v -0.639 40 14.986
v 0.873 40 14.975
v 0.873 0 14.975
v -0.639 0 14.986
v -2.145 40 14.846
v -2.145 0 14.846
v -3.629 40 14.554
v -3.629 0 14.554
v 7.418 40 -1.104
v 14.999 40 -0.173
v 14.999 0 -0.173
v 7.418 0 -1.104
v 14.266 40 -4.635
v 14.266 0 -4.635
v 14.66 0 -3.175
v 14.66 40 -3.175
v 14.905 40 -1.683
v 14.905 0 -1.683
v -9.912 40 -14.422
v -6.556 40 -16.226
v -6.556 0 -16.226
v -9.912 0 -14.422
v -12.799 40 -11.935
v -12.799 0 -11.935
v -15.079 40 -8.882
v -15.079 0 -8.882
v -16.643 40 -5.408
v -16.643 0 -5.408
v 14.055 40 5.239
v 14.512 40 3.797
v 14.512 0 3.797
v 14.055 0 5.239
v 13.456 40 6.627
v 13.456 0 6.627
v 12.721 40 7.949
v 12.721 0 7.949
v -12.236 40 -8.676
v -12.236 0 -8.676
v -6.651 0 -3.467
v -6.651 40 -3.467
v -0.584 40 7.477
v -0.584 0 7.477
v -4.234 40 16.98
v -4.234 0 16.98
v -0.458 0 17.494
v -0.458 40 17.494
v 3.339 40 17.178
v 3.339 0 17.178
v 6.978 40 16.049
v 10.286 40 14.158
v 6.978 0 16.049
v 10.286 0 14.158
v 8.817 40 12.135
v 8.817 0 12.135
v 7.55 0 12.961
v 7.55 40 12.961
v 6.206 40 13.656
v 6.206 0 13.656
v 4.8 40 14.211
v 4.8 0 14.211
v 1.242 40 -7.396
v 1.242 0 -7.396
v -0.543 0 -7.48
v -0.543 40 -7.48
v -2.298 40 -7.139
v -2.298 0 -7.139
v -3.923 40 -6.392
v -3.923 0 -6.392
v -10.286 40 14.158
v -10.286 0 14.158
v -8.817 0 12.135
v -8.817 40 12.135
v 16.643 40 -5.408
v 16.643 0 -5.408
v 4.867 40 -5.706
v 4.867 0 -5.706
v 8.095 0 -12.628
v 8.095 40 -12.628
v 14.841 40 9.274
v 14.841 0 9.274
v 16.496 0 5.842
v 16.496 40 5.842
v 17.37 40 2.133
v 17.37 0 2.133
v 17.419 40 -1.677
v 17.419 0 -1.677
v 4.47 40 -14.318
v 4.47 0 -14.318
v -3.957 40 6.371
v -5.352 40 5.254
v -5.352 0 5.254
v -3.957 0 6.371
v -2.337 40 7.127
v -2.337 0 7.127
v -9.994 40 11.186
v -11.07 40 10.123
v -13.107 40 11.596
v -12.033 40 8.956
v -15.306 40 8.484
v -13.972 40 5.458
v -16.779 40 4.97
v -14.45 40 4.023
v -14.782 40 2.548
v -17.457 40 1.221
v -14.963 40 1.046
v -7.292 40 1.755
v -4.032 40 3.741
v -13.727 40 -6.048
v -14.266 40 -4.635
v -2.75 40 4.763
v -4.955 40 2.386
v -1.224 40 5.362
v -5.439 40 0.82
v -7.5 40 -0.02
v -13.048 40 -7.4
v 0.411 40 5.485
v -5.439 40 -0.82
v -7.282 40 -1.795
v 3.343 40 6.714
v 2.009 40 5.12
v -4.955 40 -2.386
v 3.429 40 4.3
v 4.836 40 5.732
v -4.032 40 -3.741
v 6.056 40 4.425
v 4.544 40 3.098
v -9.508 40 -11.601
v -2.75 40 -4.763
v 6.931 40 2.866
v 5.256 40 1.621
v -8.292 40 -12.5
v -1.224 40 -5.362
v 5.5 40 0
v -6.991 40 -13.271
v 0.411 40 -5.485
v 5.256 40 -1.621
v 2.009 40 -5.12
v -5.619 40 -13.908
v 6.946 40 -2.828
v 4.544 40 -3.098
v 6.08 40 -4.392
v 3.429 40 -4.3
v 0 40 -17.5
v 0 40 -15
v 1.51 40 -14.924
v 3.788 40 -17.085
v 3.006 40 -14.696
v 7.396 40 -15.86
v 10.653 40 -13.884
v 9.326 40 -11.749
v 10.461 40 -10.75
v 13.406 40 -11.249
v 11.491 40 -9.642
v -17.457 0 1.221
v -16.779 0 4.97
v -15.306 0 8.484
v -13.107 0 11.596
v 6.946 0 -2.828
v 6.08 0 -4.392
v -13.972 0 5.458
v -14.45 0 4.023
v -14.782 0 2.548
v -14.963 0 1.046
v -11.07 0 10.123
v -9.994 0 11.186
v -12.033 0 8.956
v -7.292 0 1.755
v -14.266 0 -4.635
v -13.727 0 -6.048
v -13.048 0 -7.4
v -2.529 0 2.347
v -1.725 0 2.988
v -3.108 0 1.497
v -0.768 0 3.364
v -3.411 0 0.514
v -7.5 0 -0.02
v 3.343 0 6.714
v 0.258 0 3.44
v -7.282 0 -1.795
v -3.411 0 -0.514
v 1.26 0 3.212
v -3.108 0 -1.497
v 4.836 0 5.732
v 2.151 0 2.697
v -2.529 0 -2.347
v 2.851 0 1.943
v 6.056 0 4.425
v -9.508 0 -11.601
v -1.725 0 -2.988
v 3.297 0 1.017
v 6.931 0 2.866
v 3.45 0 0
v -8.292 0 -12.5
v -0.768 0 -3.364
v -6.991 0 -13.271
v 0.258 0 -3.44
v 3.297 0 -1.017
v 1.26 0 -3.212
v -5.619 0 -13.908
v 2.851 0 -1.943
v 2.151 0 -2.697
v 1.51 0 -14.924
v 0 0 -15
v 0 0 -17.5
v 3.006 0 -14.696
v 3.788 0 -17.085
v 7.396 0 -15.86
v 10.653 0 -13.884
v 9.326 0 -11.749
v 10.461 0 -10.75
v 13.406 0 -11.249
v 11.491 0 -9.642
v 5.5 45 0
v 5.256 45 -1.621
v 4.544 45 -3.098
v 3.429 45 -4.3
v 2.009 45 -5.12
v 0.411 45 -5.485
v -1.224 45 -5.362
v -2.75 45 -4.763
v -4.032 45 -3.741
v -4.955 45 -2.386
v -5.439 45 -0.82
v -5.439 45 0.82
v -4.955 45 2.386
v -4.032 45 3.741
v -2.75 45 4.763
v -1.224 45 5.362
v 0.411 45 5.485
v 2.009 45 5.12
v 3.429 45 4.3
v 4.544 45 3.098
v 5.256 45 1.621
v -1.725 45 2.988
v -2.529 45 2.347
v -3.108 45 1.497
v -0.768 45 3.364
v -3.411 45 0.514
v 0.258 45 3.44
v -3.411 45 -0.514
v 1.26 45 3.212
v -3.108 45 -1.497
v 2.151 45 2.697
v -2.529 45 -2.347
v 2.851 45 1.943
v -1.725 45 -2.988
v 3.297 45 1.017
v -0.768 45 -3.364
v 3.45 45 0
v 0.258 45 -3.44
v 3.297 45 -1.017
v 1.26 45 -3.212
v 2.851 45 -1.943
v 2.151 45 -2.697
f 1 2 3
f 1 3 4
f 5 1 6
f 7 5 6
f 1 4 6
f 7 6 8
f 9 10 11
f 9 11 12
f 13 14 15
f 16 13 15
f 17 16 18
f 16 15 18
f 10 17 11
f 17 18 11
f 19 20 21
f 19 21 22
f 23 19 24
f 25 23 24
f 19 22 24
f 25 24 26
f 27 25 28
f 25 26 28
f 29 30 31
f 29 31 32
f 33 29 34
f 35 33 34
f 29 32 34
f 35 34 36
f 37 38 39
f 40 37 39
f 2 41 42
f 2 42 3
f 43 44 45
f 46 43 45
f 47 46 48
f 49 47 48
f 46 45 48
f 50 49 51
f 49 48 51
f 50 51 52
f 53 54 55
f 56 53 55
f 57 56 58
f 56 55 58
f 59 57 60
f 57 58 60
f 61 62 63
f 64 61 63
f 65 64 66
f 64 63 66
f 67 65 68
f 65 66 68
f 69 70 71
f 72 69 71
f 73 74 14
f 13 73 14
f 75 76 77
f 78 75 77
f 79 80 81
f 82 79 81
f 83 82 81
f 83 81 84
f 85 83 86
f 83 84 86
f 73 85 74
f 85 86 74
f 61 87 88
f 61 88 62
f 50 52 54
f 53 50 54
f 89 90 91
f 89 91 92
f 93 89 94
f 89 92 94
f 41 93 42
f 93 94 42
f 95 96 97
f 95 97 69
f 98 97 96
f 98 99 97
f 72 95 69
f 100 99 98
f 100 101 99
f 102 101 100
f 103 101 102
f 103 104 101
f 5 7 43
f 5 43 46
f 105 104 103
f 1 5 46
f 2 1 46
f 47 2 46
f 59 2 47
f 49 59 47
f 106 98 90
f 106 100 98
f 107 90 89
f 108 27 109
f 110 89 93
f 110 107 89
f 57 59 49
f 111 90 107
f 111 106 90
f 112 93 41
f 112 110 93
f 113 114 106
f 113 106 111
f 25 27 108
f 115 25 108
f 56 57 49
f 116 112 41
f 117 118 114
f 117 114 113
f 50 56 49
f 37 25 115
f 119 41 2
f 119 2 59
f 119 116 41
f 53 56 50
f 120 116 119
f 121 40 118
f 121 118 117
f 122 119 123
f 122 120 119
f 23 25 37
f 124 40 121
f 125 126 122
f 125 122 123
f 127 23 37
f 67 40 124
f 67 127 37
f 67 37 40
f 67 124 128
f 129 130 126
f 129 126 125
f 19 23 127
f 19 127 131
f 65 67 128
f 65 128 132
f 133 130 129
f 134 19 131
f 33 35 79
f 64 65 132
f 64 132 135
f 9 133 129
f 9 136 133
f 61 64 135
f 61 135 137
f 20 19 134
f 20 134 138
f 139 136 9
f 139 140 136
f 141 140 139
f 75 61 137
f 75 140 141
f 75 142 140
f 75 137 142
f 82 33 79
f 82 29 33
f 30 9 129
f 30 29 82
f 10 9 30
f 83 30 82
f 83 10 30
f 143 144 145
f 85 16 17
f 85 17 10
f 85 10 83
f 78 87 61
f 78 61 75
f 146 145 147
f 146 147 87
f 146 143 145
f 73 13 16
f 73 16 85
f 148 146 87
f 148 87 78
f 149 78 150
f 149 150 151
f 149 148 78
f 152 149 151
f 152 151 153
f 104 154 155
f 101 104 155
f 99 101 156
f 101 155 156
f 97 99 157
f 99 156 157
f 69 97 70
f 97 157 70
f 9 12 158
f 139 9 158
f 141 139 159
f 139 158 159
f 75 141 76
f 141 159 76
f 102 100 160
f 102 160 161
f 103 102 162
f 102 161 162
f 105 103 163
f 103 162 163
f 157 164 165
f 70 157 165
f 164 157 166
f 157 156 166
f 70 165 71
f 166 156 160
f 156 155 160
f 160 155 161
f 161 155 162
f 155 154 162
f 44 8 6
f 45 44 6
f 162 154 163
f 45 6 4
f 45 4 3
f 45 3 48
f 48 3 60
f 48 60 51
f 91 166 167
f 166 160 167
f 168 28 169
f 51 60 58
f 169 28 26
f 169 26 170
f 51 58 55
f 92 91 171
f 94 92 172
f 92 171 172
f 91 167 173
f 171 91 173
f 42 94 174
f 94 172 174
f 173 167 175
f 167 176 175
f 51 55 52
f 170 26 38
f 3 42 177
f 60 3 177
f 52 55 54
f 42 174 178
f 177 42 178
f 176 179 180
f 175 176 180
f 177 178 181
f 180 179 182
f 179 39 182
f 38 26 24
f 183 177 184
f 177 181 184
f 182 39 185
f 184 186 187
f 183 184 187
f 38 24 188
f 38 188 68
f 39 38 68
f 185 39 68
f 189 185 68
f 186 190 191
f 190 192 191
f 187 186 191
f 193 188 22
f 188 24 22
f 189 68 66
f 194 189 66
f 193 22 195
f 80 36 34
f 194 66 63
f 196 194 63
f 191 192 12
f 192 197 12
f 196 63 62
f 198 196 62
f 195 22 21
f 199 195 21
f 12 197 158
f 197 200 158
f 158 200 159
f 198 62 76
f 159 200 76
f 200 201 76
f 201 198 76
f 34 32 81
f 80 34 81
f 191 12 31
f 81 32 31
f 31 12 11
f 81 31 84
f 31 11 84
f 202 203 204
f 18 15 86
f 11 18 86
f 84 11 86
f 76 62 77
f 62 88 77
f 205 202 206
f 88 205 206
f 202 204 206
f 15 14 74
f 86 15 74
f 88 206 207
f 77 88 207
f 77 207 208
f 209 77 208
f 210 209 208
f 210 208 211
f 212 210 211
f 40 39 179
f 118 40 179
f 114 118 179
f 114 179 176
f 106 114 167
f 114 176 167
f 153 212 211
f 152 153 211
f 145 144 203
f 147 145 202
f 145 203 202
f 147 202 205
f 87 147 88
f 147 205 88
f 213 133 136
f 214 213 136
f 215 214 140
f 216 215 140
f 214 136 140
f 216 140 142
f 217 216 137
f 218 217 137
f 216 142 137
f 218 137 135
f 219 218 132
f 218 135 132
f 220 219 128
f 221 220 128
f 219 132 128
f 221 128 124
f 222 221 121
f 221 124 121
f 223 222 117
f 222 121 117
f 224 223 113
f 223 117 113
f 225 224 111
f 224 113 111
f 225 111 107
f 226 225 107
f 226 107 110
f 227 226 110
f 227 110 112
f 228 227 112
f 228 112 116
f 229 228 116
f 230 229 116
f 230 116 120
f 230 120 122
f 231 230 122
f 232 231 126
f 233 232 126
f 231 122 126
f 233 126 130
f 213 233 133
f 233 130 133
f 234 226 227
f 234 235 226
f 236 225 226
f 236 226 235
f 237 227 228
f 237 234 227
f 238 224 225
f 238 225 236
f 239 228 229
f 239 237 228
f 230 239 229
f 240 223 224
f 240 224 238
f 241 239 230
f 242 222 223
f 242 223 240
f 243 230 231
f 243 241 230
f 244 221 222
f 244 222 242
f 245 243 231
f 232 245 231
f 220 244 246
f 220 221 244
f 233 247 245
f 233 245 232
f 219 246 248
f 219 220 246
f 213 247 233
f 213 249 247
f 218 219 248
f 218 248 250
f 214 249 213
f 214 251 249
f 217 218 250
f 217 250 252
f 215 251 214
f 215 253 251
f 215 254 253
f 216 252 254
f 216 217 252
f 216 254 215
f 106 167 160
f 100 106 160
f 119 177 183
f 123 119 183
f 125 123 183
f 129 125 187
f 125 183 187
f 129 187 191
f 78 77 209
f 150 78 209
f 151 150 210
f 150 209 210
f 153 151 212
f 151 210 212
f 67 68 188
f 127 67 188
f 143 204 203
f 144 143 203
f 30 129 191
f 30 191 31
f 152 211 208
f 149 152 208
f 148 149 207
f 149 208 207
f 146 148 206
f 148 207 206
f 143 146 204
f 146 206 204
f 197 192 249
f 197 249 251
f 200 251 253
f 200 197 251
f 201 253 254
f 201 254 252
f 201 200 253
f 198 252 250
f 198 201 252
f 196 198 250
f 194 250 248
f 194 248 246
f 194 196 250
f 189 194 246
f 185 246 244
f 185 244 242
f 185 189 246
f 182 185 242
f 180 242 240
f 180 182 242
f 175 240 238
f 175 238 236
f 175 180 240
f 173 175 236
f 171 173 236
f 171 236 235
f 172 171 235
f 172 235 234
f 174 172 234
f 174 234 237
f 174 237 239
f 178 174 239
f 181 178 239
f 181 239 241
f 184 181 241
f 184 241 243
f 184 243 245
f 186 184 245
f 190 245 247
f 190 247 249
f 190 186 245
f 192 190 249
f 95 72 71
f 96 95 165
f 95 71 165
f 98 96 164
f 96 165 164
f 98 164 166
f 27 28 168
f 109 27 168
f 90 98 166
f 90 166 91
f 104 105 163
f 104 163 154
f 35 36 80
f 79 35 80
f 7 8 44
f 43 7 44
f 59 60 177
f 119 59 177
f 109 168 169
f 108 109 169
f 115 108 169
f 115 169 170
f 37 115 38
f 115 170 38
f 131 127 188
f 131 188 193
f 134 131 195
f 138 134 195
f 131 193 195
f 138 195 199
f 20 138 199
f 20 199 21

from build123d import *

# Parameters (mm, degrees)
BOSS_EXTRUDE2_DEPTH   = 40
BOSS_EXTRUDE2_2_DEPTH = 40
BOSS_EXTRUDE2_3_DEPTH = 40
BOSS_EXTRUDE2_4_DEPTH = 40
BOSS_EXTRUDE2_5_DEPTH = 40
BOSS_EXTRUDE3_DEPTH   = 40
SKETCH3_R             = 7.5
BOSS_EXTRUDE4_DEPTH   = 40
SKETCH5_R             = 5.5
BOSS_EXTRUDE5_DEPTH   = 5
SKETCH4_R             = 3.45
CUT_EXTRUDE1_DEPTH    = 45


with BuildPart() as part:
    # Sketch1 → Boss-Extrude2 (new body)
    with BuildSketch(Plane(origin=(0, 0, 0), x_dir=(1, 0, 0), z_dir=(0, 1, 0))):
        with BuildLine():
            Line((0, 17.5), (0, 15))
            ThreePointArc((0, 15), (6.339273926, 13.594616806), (11.490666647, 9.641814145))
            Line((11.490666647, 9.641814145), (13.405777755, 11.24878317))
            ThreePointArc((13.405777755, 11.24878317), (7.39581958, 15.860386273), (0, 17.5))
        make_face()
    extrude(amount=BOSS_EXTRUDE2_DEPTH)



with BuildPart() as body_2:
    # Sketch1 → Boss-Extrude2 2 (new body)
    with BuildSketch(Plane(origin=(0, 0, 0), x_dir=(1, 0, 0), z_dir=(0, 1, 0))):
        with BuildLine():
            Line((16.643489035, 5.407797402), (14.265847744, 4.635254916))
            ThreePointArc((14.265847744, 4.635254916), (14.888192275, -1.828040151), (12.720721442, -7.948788963))
            Line((12.720721442, -7.948788963), (14.840841683, -9.273587124))
            ThreePointArc((14.840841683, -9.273587124), (17.369557654, -2.13271351), (16.643489035, 5.407797402))
        make_face()
    extrude(amount=BOSS_EXTRUDE2_2_DEPTH)


with BuildPart() as body_3:
    # Sketch1 → Boss-Extrude2 3 (new body)
    with BuildSketch(Plane(origin=(0, 0, 0), x_dir=(1, 0, 0), z_dir=(0, 1, 0))):
        with BuildLine():
            Line((10.286241915, -14.157797402), (8.816778784, -12.135254916))
            ThreePointArc((8.816778784, -12.135254916), (2.862134931, -14.724407752), (-3.628828434, -14.554435894))
            Line((-3.628828434, -14.554435894), (-4.233633173, -16.98017521))
            ThreePointArc((-4.233633173, -16.98017521), (3.339157419, -17.17847571), (10.286241915, -14.157797402))
        make_face()
    extrude(amount=BOSS_EXTRUDE2_3_DEPTH)


with BuildPart() as body_4:
    # Sketch1 → Boss-Extrude2 4 (new body)
    with BuildSketch(Plane(origin=(0, 0, 0), x_dir=(1, 0, 0), z_dir=(0, 1, 0))):
        with BuildLine():
            Line((-10.286241915, -14.157797402), (-8.816778784, -12.135254916))
            ThreePointArc((-8.816778784, -12.135254916), (-13.119295607, -7.272144304), (-14.963460754, -1.046347106))
            Line((-14.963460754, -1.046347106), (-17.45737088, -1.220738291))
            ThreePointArc((-17.45737088, -1.220738291), (-15.305844875, -8.484168354), (-10.286241915, -14.157797402))
        make_face()
    extrude(amount=BOSS_EXTRUDE2_4_DEPTH)


with BuildPart() as body_5:
    # Sketch1 → Boss-Extrude2 5 (new body)
    with BuildSketch(Plane(origin=(0, 0, 0), x_dir=(1, 0, 0), z_dir=(0, 1, 0))):
        with BuildLine():
            Line((-16.643489035, 5.407797402), (-14.265847744, 4.635254916))
            ThreePointArc((-14.265847744, 4.635254916), (-10.970305524, 10.229975401), (-5.619098901, 13.907757819))
            Line((-5.619098901, 13.907757819), (-6.555615385, 16.225717455))
            ThreePointArc((-6.555615385, 16.225717455), (-12.798689778, 11.934971301), (-16.643489035, 5.407797402))
        make_face()
    extrude(amount=BOSS_EXTRUDE2_5_DEPTH)


with BuildPart() as part_1:
    add(part.part)

    add(body_2.part)  # Boss-Extrude3 merges body 2

    add(body_3.part)  # Boss-Extrude3 merges body 3

    add(body_4.part)  # Boss-Extrude3 merges body 4

    add(body_5.part)  # Boss-Extrude3 merges body 5
    # Sketch2 → Boss-Extrude3 (add)
    with BuildSketch(Plane(origin=(0, 0, 0), x_dir=(1, 0, 0), z_dir=(0, 1, 0))):
        Polygon((-1.438002264, -3.083805807), (0.898880564, -15.106025742), (4.825389298, -14.342789761), (2.48850647, -2.320569825), (14.644453588, -3.813132454), (15.131930961, 0.157052152), (2.975983844, 1.649614781), (8.1518895, 12.749380282), (4.526658352, 14.439853329), (-0.649247305, 3.340087828), (-9.606308804, 11.692682804), (-12.334302244, 8.767267998), (-3.377240745, 0.414673022), (-14.088914848, -5.522904889), (-12.149676367, -9.021383718), align=None)
        Polygon((-0.334260109, 0.311702594), (0.152686649, 0.084635592), (0.087207921, -0.448645859), align=None, mode=Mode.SUBTRACT)
    extrude(amount=BOSS_EXTRUDE3_DEPTH)

    # Sketch3 → Boss-Extrude4 (add)
    with BuildSketch(Plane(origin=(0, 0, 0), x_dir=(1, 0, 0), z_dir=(0, 1, 0))):
        Circle(SKETCH3_R)
    extrude(amount=BOSS_EXTRUDE4_DEPTH)

    # Sketch5 → Boss-Extrude5 (add)
    with BuildSketch(Plane(origin=(0, 40, 0), x_dir=(1, 0, 0), z_dir=(0, 1, 0))):
        Circle(SKETCH5_R)
    extrude(amount=BOSS_EXTRUDE5_DEPTH)

    # Sketch4 → Cut-Extrude1 (cut)
    with BuildSketch(Plane(origin=(0, 0, 0), x_dir=(1, 0, 0), z_dir=(0, 1, 0))):
        Circle(SKETCH4_R)
    extrude(amount=CUT_EXTRUDE1_DEPTH, mode=Mode.SUBTRACT)


solid = part_1.part
